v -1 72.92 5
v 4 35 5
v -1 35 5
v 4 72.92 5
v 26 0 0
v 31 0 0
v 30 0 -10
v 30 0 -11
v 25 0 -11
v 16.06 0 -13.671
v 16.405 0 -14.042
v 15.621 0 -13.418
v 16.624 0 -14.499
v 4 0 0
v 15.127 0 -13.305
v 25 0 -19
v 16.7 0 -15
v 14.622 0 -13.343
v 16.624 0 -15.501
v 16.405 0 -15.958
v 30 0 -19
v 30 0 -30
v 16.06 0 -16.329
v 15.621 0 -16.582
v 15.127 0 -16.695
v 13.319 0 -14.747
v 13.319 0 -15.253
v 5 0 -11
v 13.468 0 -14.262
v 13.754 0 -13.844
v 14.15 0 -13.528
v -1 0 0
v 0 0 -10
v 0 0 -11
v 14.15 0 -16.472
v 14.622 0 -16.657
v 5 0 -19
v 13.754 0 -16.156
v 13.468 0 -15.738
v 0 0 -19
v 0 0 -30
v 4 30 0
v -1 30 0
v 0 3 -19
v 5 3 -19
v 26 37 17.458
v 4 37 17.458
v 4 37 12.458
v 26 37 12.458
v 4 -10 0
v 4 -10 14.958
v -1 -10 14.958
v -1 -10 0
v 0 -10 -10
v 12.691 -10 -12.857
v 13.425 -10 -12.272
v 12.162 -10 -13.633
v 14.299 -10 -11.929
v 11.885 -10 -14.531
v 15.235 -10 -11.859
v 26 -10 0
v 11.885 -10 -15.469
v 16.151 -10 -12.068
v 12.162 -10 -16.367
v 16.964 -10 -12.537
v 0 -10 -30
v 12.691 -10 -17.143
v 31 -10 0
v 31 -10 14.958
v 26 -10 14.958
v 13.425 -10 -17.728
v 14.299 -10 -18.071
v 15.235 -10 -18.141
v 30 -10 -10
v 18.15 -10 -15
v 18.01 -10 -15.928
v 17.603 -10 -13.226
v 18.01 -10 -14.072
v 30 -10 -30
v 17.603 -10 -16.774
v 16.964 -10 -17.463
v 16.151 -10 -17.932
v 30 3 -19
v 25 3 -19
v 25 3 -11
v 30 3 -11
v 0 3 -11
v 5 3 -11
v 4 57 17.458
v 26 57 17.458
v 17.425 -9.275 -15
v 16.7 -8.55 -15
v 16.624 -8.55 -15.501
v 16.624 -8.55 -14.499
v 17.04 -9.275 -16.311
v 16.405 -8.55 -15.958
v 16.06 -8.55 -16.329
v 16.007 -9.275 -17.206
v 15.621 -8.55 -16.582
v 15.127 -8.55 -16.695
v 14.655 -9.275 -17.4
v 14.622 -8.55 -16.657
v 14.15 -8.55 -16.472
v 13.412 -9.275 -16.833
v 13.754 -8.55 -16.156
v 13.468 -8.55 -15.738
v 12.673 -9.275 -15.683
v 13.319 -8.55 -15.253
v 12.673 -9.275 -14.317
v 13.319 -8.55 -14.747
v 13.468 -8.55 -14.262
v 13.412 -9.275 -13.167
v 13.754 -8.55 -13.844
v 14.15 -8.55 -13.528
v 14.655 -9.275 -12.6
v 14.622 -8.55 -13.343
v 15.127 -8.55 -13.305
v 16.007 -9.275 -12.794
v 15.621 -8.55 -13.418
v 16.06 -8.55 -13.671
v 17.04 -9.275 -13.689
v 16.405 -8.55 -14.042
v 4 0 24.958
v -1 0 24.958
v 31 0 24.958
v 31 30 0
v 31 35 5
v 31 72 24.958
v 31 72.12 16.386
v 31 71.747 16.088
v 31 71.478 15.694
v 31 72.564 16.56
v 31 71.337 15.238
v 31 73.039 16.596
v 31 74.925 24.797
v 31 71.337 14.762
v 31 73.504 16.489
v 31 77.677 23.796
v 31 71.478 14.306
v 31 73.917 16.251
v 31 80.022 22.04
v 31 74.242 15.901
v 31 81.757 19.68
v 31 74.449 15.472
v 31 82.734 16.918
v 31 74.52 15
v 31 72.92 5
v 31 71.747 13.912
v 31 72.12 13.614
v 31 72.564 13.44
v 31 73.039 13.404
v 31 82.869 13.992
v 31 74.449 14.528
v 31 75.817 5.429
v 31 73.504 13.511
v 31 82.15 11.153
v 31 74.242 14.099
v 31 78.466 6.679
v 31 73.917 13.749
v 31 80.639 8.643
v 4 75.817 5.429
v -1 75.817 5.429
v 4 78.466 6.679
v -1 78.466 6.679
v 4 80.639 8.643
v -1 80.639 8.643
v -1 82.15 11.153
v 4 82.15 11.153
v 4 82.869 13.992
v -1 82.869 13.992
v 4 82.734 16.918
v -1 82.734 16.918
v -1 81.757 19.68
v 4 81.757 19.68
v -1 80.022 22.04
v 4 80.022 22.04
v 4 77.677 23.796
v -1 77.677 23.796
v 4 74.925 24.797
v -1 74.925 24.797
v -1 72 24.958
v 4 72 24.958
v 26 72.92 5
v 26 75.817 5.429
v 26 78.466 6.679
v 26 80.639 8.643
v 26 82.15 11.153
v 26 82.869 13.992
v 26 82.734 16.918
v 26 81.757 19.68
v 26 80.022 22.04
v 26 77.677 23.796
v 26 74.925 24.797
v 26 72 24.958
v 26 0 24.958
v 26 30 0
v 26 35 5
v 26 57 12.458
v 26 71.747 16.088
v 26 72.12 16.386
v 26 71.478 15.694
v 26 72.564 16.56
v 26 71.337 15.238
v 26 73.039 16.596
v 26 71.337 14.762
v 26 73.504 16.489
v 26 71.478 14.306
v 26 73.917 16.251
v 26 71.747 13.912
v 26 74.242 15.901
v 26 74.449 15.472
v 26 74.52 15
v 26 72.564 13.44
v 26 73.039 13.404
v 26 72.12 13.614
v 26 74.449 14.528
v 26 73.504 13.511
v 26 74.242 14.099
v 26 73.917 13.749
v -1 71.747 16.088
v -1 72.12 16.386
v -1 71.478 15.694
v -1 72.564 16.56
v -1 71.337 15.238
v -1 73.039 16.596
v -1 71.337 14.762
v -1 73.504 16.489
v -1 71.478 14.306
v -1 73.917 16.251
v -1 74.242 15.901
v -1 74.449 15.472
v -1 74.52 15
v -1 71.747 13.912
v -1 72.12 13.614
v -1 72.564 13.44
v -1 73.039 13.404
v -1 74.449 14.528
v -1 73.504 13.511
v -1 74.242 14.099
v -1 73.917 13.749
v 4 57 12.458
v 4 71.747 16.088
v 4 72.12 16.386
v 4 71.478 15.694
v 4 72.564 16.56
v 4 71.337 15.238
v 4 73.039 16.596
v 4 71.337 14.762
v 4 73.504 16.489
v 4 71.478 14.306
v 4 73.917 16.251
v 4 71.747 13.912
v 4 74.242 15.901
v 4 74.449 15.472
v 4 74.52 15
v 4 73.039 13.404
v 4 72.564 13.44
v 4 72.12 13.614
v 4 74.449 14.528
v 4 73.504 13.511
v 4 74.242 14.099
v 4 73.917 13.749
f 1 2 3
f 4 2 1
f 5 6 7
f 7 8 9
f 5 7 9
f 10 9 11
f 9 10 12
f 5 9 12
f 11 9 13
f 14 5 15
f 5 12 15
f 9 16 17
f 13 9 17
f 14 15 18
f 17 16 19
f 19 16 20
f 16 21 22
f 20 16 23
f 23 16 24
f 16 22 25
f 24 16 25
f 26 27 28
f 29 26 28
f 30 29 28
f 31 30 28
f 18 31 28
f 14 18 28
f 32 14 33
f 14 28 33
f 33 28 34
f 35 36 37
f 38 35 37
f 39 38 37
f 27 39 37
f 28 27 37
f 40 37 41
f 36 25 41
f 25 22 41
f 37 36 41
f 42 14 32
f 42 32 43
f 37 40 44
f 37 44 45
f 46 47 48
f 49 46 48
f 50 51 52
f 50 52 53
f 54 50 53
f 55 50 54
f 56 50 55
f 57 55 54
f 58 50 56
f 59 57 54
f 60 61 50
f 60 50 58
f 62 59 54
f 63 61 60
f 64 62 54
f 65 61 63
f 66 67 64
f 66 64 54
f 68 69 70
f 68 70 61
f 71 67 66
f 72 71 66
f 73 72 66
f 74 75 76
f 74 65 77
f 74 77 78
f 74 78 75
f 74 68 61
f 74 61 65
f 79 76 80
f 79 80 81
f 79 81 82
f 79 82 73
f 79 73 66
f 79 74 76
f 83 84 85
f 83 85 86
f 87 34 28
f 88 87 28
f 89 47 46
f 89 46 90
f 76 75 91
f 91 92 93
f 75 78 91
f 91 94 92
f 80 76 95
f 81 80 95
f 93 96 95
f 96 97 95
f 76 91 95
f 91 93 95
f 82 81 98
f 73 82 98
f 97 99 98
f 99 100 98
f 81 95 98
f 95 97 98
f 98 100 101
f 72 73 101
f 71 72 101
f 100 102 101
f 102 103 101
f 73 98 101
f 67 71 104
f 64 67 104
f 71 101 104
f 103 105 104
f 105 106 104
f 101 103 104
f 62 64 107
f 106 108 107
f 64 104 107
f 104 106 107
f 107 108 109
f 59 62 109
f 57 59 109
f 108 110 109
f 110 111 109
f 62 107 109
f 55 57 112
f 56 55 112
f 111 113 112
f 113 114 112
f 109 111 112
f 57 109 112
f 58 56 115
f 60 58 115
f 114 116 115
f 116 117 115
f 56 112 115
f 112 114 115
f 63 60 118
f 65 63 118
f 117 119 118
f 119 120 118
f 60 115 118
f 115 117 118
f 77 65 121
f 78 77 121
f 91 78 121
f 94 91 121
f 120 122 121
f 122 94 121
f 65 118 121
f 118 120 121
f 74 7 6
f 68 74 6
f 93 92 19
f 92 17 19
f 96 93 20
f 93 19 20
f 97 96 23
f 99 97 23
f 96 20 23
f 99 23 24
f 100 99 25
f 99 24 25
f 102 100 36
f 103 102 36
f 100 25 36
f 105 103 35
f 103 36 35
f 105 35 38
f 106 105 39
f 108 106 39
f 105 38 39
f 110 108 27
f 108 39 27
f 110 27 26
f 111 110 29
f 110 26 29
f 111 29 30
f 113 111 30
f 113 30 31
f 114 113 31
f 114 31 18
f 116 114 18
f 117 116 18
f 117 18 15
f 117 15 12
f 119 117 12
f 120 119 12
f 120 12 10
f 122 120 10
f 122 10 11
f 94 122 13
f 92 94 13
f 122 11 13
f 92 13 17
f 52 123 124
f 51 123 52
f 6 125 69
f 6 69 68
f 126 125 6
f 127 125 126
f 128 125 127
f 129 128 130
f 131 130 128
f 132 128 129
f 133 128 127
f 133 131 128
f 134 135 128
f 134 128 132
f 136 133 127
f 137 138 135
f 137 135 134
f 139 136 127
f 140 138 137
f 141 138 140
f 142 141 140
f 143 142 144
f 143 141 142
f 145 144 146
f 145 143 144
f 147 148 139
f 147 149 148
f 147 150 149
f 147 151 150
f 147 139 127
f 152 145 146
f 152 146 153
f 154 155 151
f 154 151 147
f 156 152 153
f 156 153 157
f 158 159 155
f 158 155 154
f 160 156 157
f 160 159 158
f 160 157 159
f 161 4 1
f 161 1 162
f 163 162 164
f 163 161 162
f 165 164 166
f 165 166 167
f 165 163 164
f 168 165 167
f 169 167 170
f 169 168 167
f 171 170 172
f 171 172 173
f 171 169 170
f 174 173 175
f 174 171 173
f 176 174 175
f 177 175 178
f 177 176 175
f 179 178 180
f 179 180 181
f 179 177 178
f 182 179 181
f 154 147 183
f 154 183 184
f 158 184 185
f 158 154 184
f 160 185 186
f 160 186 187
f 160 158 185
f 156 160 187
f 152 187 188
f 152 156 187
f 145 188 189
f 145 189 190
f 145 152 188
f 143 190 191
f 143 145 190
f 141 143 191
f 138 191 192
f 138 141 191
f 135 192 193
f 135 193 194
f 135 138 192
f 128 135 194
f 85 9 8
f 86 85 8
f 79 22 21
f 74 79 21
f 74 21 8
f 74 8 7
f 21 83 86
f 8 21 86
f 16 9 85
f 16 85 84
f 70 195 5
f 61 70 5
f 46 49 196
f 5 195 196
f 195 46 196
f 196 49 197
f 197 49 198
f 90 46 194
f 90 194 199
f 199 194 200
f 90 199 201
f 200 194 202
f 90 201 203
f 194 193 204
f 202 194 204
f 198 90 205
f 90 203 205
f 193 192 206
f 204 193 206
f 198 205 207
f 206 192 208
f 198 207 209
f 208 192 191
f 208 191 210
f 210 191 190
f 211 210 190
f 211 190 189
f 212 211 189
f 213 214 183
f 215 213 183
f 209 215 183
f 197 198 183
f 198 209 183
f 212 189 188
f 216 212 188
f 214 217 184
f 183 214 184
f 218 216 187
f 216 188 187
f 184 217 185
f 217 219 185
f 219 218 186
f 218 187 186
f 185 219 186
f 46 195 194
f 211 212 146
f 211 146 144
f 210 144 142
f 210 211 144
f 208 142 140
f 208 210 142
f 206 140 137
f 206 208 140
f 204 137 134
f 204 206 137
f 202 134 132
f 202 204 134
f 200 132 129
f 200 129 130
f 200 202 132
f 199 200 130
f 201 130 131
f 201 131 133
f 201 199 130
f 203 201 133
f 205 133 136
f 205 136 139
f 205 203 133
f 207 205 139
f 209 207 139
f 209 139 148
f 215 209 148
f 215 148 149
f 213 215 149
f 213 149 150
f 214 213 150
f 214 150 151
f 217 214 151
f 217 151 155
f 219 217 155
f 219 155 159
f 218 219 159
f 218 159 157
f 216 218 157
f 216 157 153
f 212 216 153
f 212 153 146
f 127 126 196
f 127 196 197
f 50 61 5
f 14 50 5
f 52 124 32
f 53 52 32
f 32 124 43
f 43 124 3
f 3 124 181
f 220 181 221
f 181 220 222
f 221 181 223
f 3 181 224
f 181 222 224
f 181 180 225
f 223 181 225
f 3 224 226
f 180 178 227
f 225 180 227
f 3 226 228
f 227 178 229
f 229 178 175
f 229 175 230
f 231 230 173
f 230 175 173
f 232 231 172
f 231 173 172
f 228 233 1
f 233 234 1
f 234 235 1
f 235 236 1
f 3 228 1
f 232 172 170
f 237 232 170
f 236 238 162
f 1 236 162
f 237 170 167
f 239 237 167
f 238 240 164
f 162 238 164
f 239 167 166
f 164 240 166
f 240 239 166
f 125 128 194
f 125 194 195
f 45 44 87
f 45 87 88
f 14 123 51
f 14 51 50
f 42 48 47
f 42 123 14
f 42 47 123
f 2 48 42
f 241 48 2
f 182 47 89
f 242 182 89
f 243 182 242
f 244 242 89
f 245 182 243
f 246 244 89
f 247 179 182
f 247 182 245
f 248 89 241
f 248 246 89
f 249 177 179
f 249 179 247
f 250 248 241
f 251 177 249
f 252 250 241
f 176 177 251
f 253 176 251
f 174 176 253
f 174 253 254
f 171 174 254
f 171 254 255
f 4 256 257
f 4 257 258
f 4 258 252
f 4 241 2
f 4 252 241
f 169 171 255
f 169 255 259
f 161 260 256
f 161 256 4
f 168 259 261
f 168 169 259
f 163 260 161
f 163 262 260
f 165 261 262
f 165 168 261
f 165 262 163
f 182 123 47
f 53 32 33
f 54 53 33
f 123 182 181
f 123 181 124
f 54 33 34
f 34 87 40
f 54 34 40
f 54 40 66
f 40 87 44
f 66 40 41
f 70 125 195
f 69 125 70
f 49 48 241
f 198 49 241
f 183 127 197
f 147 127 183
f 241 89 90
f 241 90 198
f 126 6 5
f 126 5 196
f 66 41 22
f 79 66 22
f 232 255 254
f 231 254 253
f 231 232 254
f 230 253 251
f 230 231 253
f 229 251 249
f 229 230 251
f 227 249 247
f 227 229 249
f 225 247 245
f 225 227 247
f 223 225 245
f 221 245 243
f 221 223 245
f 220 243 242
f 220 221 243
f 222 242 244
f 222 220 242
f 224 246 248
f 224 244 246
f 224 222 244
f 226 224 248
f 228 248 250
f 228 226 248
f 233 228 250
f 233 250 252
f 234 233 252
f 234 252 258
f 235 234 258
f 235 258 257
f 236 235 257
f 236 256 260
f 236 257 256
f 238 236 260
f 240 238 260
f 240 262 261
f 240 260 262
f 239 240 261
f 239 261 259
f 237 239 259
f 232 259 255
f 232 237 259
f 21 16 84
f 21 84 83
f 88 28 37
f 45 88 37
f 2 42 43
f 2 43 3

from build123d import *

# Parameters (mm, degrees)
EXTRUDE_1_DEPTH     = 10
SKETCH_4_W          = 5
SKETCH_4_H          = 8
EXTRUDE_3_DEPTH     = 3
EXTRUDE_4_DEPTH     = 16
CUT_EXTRUDE_1_DEPTH = 11
SKETCH_15_W         = 5
SKETCH_15_H         = 20
EXTRUDE_5_DEPTH     = 22
OTHER_START         = -1
OTHER_4_OUTLINE_R   = 1.6
OTHER_4_DEPTH       = 32


# Read off the part's stored shape, not the designer's step: 高级异型孔3, 高级异型孔4
with BuildPart() as part:
    # 草图1 → 凸台-拉伸1 (new body)
    with BuildSketch(Plane(origin=(0, 0, 0), x_dir=(1, 0, 0), z_dir=(0, 1, 0))):
        Polygon((0, 10), (0, 30), (30, 30), (30, 10), (31, 0), (30, 0), (0, 0), (-1, 0), align=None)
    extrude(amount=-EXTRUDE_1_DEPTH)

    # 草图4 → 凸台-拉伸3 (add)
    with BuildSketch(Plane(origin=(0, 0, 0), x_dir=(1, 0, 0), z_dir=(0, 1, 0))):
        with Locations((2.5, 15)):
            Rectangle(SKETCH_4_W, SKETCH_4_H)
        with Locations((27.5, 15)):
            Rectangle(SKETCH_4_W, SKETCH_4_H)
    extrude(amount=EXTRUDE_3_DEPTH)

    # 高级异型孔3 outline → 高级异型孔3 (revolve, cut)
    with BuildSketch(Plane(origin=(15, 0, -15), x_dir=(1, 0, 0), z_dir=(0, 0, 1))):
        Polygon((0, -10), (3.15, -10), (1.7, -8.55), (1.7, 0), (0, 0), align=None)
    revolve(axis=Axis((15, 0, -15), (0, 1, 0)), mode=Mode.SUBTRACT)

    # 草图13 → 凸台-拉伸4 (add, symmetric)
    with BuildSketch(Plane(origin=(15, 0, 0), x_dir=(0, 0, -1), z_dir=(1, 0, 0))):
        with BuildLine():
            Line((-24.95762742, 72), (-24.95762742, 0))
            Line((-24.95762742, 0), (-14.95762742, -10))
            Line((-14.95762742, -10), (0, -10))
            Line((0, -10), (0, 30))
            Line((0, 30), (-5, 35))
            Line((-5, 35), (-5, 72.919595656))
            ThreePointArc((-5, 72.919595656), (-15.460285674, 82.908996895), (-24.95762742, 72))
        make_face()
    extrude(amount=EXTRUDE_4_DEPTH, both=True)

    # 草图13<2> → 切除-拉伸1 (cut, symmetric)
    with BuildSketch(Plane(origin=(15, 0, 0), x_dir=(0, 0, -1), z_dir=(1, 0, 0))):
        with BuildLine():
            Line((-24.95762742, 72), (-24.95762742, 0))
            Line((-24.95762742, 0), (-14.95762742, -10))
            Line((-14.95762742, -10), (0, -10))
            Line((0, -10), (0, 30))
            Line((0, 30), (-5, 35))
            Line((-5, 35), (-5, 72.919595656))
            ThreePointArc((-5, 72.919595656), (-15.460285674, 82.908996895), (-24.95762742, 72))
        make_face()
    extrude(amount=CUT_EXTRUDE_1_DEPTH, both=True, mode=Mode.SUBTRACT)

    # 草图15 → 凸台-拉伸5 (add)
    with BuildSketch(Plane(origin=(4, 0, 0), x_dir=(0, 0, -1), z_dir=(1, 0, 0))):
        with Locations((-14.95762742, 47)):
            Rectangle(SKETCH_15_W, SKETCH_15_H)
    extrude(amount=EXTRUDE_5_DEPTH)

    # 高级异型孔4 outline → 高级异型孔4 (cut)
    with BuildSketch(Plane.YZ.offset(OTHER_START)):
        with Locations((72.919595656, 15)):
            Circle(OTHER_4_OUTLINE_R)
    extrude(amount=OTHER_4_DEPTH, mode=Mode.SUBTRACT)


solid = part.part
